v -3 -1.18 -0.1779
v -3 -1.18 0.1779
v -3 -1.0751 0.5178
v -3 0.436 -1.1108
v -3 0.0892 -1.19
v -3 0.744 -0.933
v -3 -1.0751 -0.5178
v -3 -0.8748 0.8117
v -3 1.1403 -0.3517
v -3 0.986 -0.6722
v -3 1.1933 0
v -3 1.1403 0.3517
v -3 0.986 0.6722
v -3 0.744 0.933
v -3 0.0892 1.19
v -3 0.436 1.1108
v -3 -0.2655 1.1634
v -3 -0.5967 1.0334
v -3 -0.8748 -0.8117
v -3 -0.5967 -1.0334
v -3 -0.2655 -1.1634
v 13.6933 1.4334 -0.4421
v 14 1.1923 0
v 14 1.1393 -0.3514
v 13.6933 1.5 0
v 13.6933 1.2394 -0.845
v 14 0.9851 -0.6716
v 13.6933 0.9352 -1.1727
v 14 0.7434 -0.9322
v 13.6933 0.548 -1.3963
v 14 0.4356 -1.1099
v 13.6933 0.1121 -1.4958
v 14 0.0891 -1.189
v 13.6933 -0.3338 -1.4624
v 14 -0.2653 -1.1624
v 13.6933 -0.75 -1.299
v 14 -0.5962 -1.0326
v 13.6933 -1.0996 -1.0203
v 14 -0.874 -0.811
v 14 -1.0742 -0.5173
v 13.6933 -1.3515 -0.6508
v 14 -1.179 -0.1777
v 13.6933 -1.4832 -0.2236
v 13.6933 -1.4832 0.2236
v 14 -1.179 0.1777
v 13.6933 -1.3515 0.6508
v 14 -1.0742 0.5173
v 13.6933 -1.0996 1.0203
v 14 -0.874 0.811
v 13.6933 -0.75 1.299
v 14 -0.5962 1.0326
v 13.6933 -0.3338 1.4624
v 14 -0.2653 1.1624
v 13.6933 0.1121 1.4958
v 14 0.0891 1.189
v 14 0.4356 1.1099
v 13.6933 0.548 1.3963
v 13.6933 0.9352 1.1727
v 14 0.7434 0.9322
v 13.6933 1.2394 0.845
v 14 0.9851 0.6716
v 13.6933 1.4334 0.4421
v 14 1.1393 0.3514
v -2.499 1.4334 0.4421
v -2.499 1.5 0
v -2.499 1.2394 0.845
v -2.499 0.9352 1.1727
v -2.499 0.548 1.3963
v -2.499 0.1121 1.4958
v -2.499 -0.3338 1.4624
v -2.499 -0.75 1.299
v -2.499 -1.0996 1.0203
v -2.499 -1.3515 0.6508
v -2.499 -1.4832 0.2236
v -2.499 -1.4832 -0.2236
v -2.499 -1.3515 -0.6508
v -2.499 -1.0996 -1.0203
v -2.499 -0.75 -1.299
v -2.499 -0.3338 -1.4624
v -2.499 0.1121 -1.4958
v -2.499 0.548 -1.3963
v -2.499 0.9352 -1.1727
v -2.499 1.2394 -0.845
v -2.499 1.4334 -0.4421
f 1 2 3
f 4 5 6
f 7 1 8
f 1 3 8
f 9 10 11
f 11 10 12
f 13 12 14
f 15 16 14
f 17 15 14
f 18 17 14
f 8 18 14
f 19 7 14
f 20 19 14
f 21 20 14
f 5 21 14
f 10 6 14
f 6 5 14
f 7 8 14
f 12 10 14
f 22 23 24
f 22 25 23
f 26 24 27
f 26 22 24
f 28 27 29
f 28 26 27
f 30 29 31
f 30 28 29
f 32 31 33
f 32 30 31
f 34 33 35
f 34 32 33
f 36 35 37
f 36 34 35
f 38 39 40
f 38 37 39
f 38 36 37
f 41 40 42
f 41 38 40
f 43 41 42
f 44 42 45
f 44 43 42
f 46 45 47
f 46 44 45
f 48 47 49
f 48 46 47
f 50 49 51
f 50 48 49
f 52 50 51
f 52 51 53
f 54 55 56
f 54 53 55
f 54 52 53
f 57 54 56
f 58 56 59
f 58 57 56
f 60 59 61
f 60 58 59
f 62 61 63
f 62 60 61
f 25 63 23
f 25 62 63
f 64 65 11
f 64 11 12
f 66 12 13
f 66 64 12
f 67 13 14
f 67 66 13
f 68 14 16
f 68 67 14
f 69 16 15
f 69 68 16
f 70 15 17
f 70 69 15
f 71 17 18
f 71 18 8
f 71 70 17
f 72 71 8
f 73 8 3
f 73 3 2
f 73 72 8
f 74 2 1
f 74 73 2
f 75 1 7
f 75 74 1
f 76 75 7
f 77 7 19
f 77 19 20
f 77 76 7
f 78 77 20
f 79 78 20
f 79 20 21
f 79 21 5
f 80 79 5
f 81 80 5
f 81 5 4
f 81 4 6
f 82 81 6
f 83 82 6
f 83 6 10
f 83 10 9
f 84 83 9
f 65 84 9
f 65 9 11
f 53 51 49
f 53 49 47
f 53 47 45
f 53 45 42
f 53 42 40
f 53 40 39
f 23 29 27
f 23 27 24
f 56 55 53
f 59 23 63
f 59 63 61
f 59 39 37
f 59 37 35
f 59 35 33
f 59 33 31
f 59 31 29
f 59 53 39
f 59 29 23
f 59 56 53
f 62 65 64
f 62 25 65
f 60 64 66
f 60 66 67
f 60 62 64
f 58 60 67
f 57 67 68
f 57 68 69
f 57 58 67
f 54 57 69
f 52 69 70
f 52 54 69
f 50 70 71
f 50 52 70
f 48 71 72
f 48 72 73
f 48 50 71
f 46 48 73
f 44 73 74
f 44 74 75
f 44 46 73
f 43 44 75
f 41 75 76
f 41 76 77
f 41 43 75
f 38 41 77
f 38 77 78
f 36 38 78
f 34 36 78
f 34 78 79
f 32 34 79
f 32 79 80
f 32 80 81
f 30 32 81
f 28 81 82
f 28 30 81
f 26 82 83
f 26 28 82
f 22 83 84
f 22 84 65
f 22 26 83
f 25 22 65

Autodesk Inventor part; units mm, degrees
ref_plane "YZ Plane" through (0, 0, 0) normal (1, 0, 0) x (0, 1, 0)
ref_plane "XZ Plane" through (0, 0, 0) normal (0, 1, 0) x (-1, 0, 0)
sketch "Sketch1" plane through (0, 0, 0) normal (0, 0, 1) x (1, 0, 0)
  line L0 (14, 1.5) -> (14, 0)
  line L1 (-3, 0) -> (14, 0)
  line L2 (-6.4, 0) -> (17.4, 0) projected
  line L3 (0, 1.8) -> (0, -0.3) projected
  line L4 (-3, 1.5) -> (-3, 0)
  line L5 (2, 1.5) -> (2, 0) construction
  line L6 (-6.4, 0) -> (17.4, 0) projected
  line L7 (-3, 1.5) -> (14, 1.5)
  dimension "d4" = 3
  dimension "d5" = 14
  dimension "d6" = 12
  dimension "d13" = 3
revolve "Body" add sketch "Sketch1" angle 360 about axis through (-3, 0, 0) along (1, 0, 0)
thread "Thread1" size "M3x0.5" class "6g" standard "ISO Metric profile" length 3
thread "Thread2" size "M3x0.5" class "6g" standard "ISO Metric profile" length 12.3067
chamfer "Chamfer1" distance 0.3077 distance2 0.3067 1 edges at (14, -1.5, 0) measured on face at (14, -0.7567, -0.3972)
chamfer "Chamfer2" distance 0.501 distance2 0.3067 1 edges at (-3, -1.5, 0) measured on face at (8.1289, 1.4951, -0.1207)
ref_plane "Work Plane1" through (2.75, 0, 0) normal (0, -1, 0) x (1, 0, 0)
equation "\"d4\" = KOH"
equation "\"d5\" = NLG"
equation "\"d6\" = GEL"
equation "\"d13\" = GD"
equation "\"d1\" = KOH"
equation "\"d7\" = GEL + GAL"
equation "\"d10\" = -0.5 * SPD + 0.5 * GD"
equation "\"d12\" = -0.5 * SPD + 0.5 * GD"
equation "\"NLG\" = 14"
equation "\"GEL\" = 12"
equation "\"GAL\" = 0.61345 * PTC"
equation "\"SPD\" = NND - 1.2269 * PTC"
equation "\"d0\" = GD"
equation "\"GUL\" = 0.61345 * PTC"
equation "\"KOH\" = NND"
equation "\"GD\" = NND"
equation "\"BDM\" = NND"
equation "\"GUL1\" = 0.5"
equation "\"GAL1\" = 0.5"
equation "\"d80\" = -GUL - GEL"
equation "\"d86\" = -KOH + GUL1"
equation "\"PTC\" = 0.5"
equation "\"THREADDIA\" = 3"
equation "\"TOA\" = 30deg"
equation "\"NND\" = 3"
equation "\"GD1\" = THREADDIA - 1.2269 * PTC"
properties part number "CSN 02 1174 - A M3 x 14" material "Steel, Mild"
